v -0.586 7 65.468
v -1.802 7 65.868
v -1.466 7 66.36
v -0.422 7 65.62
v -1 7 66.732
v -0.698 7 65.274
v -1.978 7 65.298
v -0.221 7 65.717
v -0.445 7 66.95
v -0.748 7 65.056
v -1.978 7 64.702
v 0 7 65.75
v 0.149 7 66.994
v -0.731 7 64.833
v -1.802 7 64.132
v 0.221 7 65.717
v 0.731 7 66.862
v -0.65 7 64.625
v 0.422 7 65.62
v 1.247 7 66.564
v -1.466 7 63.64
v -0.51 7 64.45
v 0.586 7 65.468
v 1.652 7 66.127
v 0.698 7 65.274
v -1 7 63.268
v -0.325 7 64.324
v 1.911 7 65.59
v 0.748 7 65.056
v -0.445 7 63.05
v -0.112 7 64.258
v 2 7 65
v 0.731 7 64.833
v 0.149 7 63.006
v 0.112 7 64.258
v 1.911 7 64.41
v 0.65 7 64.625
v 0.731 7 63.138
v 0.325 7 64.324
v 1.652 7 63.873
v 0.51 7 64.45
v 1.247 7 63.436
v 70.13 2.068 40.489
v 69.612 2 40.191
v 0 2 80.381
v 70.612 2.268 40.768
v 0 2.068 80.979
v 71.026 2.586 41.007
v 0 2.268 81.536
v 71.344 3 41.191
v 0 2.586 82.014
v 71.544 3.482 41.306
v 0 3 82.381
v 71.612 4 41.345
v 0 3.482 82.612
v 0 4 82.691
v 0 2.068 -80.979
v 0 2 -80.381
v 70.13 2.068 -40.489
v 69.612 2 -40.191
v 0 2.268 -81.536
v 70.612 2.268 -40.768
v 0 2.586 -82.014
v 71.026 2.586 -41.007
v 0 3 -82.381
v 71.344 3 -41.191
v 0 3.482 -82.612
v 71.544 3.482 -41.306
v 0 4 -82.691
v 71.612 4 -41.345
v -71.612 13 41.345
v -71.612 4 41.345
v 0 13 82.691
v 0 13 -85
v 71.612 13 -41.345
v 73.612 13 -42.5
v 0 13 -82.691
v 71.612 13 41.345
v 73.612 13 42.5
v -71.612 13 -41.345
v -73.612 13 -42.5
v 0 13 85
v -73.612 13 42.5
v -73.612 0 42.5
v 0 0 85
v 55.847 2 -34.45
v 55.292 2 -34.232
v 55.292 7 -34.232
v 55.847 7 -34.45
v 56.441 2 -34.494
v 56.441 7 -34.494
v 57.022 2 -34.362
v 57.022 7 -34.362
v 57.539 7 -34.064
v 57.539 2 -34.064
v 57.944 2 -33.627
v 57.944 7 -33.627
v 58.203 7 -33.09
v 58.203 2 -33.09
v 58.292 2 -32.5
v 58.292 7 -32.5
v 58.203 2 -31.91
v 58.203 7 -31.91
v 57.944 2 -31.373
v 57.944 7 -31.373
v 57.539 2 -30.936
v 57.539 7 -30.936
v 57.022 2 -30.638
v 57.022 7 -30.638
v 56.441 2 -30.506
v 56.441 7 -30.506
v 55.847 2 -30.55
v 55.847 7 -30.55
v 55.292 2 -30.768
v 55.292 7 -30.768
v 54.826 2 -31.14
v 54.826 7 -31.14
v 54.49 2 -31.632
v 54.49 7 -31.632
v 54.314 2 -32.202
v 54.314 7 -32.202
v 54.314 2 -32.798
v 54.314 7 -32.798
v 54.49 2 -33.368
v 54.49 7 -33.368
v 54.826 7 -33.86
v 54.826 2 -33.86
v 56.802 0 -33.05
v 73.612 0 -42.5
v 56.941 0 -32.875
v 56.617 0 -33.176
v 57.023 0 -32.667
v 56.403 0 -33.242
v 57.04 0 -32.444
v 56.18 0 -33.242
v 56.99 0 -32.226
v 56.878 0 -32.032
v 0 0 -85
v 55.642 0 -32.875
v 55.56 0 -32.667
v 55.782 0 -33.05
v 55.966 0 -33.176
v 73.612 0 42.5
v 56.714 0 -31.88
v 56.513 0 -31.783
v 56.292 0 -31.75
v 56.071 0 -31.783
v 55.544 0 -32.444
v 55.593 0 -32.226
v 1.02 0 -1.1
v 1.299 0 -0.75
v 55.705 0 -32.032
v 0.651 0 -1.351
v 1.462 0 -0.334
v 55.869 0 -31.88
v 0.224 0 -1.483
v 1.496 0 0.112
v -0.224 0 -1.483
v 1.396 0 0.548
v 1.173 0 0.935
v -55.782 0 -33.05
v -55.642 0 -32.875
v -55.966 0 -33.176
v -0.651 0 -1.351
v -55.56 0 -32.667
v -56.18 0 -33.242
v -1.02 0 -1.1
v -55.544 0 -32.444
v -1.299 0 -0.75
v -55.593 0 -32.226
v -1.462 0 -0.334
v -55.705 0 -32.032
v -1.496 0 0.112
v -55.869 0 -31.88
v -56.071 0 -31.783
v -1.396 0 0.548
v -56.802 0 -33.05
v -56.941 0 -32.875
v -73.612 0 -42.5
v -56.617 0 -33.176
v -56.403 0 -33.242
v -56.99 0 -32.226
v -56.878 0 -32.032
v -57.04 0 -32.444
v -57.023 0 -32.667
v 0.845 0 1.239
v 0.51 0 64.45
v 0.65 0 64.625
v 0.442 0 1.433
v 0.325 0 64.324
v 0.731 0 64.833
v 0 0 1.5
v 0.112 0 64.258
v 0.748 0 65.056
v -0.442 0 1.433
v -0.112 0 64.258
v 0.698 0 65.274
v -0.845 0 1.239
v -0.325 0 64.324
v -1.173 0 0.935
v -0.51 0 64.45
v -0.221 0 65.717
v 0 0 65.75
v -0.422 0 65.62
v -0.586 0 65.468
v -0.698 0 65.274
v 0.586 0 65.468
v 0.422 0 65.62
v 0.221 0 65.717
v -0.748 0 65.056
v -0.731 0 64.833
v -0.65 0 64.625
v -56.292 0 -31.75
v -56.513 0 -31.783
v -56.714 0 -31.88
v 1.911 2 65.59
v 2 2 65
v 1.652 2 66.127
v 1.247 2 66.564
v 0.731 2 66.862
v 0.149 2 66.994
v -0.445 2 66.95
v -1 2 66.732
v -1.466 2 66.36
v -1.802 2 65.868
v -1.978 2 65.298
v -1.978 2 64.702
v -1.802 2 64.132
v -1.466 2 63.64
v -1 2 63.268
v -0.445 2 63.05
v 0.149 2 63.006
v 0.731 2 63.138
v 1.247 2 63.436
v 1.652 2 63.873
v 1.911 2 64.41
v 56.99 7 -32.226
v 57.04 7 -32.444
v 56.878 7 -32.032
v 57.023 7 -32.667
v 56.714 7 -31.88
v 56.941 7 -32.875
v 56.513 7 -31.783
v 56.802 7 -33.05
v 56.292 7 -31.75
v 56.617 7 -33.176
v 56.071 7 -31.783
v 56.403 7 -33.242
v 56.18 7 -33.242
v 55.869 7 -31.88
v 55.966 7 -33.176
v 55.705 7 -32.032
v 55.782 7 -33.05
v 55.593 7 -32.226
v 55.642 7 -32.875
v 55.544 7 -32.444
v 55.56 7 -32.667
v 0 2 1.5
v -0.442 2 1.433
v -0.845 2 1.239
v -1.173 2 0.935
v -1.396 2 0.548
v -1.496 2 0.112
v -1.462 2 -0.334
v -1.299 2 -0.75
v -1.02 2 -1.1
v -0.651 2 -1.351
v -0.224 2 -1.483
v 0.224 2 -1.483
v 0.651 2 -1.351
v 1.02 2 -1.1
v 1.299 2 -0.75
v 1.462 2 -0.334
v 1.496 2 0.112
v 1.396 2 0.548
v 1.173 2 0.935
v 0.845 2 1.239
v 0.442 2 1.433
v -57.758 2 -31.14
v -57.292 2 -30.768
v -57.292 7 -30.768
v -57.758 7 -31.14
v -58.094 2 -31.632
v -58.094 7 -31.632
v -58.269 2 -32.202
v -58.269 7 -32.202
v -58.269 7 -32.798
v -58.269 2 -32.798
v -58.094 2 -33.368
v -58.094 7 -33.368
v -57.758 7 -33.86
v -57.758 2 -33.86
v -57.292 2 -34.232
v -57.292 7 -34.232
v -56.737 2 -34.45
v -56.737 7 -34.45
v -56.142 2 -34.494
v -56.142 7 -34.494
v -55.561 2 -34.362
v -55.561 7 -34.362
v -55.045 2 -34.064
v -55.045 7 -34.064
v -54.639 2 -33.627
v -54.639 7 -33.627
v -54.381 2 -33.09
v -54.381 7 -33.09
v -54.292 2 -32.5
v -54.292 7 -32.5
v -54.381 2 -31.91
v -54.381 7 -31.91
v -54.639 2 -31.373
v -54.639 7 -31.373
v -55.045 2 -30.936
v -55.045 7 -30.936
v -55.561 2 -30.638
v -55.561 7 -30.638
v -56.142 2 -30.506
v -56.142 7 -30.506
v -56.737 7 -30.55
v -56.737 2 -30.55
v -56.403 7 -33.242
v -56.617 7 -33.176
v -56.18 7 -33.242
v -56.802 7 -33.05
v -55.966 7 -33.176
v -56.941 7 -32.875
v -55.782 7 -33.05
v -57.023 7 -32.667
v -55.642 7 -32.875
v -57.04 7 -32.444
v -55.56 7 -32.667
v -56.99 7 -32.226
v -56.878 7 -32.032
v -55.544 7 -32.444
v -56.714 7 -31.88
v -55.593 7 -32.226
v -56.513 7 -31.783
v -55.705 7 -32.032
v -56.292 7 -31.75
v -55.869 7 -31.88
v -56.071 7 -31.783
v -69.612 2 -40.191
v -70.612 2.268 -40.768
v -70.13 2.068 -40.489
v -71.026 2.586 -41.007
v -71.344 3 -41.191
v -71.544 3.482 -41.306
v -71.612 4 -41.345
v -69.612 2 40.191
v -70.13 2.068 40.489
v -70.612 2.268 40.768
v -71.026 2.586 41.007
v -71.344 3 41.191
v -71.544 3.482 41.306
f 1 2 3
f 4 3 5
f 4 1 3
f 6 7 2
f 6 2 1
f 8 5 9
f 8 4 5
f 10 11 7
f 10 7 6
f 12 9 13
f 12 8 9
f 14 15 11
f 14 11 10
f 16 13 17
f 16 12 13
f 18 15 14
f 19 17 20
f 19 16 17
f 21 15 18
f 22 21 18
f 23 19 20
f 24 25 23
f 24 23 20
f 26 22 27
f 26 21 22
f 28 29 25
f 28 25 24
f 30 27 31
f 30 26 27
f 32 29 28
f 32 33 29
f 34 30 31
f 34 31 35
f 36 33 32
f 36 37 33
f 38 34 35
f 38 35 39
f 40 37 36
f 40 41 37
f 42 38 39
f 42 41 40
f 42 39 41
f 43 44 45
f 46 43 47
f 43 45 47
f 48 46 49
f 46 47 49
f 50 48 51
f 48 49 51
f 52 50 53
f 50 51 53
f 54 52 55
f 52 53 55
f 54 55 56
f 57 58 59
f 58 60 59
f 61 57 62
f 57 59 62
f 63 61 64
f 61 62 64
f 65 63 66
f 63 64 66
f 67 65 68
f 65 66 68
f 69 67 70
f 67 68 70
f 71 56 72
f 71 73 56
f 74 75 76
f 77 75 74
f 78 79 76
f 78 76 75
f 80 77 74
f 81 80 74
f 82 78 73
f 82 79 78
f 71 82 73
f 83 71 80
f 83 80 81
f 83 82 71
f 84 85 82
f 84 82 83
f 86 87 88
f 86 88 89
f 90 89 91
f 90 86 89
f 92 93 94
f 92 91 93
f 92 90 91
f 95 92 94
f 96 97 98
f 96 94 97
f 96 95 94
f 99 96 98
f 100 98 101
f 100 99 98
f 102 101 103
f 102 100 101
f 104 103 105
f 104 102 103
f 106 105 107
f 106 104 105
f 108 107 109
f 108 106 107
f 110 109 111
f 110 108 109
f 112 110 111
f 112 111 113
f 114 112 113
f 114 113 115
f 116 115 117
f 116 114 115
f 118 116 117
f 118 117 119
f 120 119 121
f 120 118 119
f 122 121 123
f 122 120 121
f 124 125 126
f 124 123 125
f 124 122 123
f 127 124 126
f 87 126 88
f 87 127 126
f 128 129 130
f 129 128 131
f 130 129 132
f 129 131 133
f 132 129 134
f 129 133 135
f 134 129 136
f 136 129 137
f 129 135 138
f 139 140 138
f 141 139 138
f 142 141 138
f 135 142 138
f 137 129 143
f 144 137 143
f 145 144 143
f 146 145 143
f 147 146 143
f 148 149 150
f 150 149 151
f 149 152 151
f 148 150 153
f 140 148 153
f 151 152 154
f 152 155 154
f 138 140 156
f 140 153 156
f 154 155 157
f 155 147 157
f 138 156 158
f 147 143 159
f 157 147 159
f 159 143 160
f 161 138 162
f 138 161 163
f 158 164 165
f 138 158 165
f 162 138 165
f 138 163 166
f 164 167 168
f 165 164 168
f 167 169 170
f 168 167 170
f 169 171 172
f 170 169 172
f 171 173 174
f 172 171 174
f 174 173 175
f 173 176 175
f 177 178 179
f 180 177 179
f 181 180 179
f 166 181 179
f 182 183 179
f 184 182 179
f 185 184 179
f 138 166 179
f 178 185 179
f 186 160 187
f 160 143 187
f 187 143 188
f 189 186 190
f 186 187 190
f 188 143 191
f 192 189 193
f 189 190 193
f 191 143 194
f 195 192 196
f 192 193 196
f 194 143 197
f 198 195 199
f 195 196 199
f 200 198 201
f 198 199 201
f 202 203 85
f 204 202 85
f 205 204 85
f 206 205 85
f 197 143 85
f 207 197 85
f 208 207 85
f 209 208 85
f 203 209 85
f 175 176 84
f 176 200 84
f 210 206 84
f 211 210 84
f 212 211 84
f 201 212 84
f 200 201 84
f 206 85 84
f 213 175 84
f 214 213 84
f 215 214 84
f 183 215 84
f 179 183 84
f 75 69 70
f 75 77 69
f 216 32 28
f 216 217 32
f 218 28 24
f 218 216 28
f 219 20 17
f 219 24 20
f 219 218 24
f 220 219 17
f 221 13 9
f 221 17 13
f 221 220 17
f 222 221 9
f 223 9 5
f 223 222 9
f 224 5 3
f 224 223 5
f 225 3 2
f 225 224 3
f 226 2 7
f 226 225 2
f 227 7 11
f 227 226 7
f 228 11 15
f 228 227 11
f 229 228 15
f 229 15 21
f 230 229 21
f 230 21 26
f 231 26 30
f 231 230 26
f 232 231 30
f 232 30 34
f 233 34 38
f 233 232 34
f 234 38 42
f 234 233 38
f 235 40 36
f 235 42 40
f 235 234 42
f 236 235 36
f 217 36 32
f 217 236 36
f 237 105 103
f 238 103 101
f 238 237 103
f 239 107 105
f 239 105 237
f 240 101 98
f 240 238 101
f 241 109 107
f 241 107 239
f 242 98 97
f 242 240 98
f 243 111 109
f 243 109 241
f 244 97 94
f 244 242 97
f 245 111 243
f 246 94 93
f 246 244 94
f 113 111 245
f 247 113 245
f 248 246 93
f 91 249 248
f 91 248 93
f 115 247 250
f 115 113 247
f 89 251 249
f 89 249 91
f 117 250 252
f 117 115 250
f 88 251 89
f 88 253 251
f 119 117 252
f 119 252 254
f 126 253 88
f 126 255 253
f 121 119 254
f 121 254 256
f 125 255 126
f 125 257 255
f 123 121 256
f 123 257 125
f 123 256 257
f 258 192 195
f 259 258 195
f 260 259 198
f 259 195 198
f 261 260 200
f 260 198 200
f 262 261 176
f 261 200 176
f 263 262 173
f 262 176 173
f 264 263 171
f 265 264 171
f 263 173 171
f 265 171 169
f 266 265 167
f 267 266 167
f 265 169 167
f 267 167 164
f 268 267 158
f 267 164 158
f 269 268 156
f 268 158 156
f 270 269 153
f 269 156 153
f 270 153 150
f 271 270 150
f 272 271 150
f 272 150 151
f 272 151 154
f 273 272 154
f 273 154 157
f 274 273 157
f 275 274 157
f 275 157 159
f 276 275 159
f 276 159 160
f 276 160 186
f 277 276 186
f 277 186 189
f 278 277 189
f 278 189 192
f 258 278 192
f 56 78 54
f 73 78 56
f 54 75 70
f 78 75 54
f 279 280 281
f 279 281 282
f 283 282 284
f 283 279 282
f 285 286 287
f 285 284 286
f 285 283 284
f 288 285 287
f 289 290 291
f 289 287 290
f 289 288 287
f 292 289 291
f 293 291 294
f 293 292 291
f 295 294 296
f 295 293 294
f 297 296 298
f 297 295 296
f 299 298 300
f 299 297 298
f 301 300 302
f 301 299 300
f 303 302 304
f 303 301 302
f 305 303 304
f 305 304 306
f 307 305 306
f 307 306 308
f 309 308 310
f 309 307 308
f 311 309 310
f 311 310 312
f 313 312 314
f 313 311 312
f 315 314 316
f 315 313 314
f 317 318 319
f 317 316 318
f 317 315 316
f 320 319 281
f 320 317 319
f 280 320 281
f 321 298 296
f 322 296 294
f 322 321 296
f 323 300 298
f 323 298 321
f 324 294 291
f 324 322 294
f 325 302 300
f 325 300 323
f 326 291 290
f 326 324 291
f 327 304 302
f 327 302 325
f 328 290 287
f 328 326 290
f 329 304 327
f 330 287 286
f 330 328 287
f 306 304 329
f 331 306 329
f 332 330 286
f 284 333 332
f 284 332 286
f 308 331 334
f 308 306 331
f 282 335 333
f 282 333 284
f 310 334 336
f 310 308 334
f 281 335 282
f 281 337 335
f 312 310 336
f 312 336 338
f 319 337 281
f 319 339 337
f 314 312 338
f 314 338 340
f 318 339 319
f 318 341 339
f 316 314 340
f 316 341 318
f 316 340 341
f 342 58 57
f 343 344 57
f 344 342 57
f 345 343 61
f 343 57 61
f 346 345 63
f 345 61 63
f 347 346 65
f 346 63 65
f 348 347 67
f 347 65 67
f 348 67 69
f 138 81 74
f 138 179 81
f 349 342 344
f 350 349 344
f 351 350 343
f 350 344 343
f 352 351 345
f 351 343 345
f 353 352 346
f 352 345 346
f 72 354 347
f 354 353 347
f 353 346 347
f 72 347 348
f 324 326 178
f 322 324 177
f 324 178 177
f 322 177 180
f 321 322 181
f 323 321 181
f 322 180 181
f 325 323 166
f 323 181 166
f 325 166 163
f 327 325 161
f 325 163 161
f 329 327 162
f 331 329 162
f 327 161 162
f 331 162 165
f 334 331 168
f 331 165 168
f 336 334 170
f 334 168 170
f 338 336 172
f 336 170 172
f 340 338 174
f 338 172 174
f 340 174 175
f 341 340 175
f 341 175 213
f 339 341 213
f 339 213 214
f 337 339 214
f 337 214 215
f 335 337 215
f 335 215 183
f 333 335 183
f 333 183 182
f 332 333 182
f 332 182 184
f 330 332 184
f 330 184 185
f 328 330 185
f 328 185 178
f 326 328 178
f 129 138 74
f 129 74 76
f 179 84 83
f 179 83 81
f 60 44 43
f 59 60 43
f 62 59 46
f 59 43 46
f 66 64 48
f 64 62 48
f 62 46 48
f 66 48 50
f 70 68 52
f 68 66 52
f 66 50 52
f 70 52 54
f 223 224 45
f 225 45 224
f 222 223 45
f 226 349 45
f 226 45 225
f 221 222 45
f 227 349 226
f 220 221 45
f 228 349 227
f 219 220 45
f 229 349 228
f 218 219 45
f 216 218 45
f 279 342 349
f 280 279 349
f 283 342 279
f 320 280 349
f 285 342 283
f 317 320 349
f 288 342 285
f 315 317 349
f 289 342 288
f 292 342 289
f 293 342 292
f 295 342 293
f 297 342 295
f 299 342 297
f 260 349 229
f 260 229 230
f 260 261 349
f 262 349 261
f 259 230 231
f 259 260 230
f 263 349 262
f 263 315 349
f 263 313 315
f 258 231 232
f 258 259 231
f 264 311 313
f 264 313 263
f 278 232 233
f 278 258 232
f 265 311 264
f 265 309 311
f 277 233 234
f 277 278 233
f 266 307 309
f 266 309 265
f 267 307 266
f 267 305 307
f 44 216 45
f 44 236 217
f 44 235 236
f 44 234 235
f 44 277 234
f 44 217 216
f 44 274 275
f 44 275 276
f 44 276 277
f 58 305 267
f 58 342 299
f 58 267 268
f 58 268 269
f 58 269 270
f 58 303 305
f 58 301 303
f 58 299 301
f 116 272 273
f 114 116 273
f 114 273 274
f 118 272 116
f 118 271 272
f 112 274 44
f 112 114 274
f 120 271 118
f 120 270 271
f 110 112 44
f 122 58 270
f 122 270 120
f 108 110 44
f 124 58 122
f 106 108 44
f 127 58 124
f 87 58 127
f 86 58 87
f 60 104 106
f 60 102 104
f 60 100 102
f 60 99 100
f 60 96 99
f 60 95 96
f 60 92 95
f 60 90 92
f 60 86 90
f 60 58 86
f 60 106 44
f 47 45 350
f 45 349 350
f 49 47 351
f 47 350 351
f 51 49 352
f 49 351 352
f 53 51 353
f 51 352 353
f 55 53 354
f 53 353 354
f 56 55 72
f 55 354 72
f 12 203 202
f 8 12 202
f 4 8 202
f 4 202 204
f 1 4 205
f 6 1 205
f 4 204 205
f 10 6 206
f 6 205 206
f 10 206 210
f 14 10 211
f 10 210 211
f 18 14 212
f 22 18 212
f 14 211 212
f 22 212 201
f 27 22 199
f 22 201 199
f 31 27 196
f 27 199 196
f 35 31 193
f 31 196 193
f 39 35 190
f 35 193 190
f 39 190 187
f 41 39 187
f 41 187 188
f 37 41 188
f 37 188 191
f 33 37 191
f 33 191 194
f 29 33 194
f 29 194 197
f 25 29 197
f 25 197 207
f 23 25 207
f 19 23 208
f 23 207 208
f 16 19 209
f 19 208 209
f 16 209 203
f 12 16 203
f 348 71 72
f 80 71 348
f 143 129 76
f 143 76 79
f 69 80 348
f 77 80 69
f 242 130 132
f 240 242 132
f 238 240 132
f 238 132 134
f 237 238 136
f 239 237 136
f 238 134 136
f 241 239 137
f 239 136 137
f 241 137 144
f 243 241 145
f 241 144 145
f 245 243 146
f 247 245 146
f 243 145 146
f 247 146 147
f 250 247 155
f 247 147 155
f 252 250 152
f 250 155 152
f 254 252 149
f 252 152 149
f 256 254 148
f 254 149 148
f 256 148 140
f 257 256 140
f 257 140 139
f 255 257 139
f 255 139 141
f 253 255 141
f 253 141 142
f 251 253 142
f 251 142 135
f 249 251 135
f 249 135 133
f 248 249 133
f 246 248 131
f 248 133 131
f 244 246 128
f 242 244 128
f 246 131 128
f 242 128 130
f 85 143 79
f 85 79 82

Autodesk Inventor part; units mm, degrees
ref_plane "YZ Plane" through (0, 0, 0) normal (1, 0, 0) x (0, 1, 0)
ref_plane "XZ Plane" through (0, 0, 0) normal (0, 1, 0) x (-1, 0, 0)
ref_plane "XY Plane" through (0, 0, 0) normal (0, 0, 1) x (1, 0, 0)
sketch "Sketch1" plane through (0, 0, 0) normal (0, 1, 0) x (-1, 0, 0)
  line L0 (0, 85) -> (73.6122, 42.5)
  line L1 (73.6122, 42.5) -> (73.6122, -42.5)
  line L2 (73.6122, -42.5) -> (0, -85)
  line L3 (0, -85) -> (-73.6122, -42.5)
  line L4 (-73.6122, -42.5) -> (-73.6122, 42.5)
  line L5 (-73.6122, 42.5) -> (0, 85)
  point P0 (0, 0)
  point P1 (0, 0)
  dimension "d0" = 0
  dimension "d1" = 85
extrude "Extrusion1" add sketch "Sketch1" along normal blind 13
sketch "Sketch2" plane through (0, 13, 0) normal (0, 1, 0) x (1, 0, 0)
  line L0 (0, -82.6906) -> (-71.6122, -41.3453)
  line L1 (-71.6122, -41.3453) -> (-71.6122, 41.3453)
  line L2 (-71.6122, 41.3453) -> (0, 82.6906)
  line L3 (0, 82.6906) -> (71.6122, 41.3453)
  line L4 (71.6122, 41.3453) -> (71.6122, -41.3453)
  line L5 (71.6122, -41.3453) -> (0, -82.6906)
  line L6 (-73.6122, 42.5) -> (-73.6122, -42.5) projected
  point P0 (0, 0)
  point P1 (0, 0)
  point P2 (0, 0)
  dimension "d6" = 0
  dimension "d7" = 2
extrude "Extrusion2" cut sketch "Sketch2" against normal blind 11
sketch "Sketch3" plane through (0, 2, 0) normal (0, 1, 0) x (1, 0, 0)
  circle A0 centre (0, -65) radius 2
  point P0 (0, 0)
  dimension "d10" = 4
  dimension "d11" = 65
extrude "Extrusion3" add sketch "Sketch3" along normal blind 5
sketch "Sketch4" plane through (0, 7, 65) normal (0, 1, 0) x (1, 0, 0)
  point P0 (0, 65)
  point P1 (0, 0)
  point P2 (0, 0)
  dimension "d14" = 65
  dimension "d15" = 0
hole "Hole1" at (0, 7, 65) direction (0, -1, 0) diameter 1.5 end through all
pattern_circular "Circular Pattern1" count 3 over 360 about axis through (0, -10, 0) along (0, 1, 0) of "Extrusion3", "Hole1"
fillet "Fillet1" radius 2 6 edges at (-71.6122, 2, 0) (-35.8061, 2, 62.0179) (35.8061, 2, 62.0179) (71.6122, 2, 0) (35.8061, 2, -62.0179) (-35.8061, 2, -62.0179)
sketch "Sketch5" plane through (0, 2, 0) normal (0, 1, 0) x (1, 0, 0)
  point P0 (0, 0)
  point P1 (0, 0)
hole "Hole2" at (0, 2, 0) direction (0, -1, 0) diameter 3 depth 3
properties part number "hexlight-top-led-nodule"
